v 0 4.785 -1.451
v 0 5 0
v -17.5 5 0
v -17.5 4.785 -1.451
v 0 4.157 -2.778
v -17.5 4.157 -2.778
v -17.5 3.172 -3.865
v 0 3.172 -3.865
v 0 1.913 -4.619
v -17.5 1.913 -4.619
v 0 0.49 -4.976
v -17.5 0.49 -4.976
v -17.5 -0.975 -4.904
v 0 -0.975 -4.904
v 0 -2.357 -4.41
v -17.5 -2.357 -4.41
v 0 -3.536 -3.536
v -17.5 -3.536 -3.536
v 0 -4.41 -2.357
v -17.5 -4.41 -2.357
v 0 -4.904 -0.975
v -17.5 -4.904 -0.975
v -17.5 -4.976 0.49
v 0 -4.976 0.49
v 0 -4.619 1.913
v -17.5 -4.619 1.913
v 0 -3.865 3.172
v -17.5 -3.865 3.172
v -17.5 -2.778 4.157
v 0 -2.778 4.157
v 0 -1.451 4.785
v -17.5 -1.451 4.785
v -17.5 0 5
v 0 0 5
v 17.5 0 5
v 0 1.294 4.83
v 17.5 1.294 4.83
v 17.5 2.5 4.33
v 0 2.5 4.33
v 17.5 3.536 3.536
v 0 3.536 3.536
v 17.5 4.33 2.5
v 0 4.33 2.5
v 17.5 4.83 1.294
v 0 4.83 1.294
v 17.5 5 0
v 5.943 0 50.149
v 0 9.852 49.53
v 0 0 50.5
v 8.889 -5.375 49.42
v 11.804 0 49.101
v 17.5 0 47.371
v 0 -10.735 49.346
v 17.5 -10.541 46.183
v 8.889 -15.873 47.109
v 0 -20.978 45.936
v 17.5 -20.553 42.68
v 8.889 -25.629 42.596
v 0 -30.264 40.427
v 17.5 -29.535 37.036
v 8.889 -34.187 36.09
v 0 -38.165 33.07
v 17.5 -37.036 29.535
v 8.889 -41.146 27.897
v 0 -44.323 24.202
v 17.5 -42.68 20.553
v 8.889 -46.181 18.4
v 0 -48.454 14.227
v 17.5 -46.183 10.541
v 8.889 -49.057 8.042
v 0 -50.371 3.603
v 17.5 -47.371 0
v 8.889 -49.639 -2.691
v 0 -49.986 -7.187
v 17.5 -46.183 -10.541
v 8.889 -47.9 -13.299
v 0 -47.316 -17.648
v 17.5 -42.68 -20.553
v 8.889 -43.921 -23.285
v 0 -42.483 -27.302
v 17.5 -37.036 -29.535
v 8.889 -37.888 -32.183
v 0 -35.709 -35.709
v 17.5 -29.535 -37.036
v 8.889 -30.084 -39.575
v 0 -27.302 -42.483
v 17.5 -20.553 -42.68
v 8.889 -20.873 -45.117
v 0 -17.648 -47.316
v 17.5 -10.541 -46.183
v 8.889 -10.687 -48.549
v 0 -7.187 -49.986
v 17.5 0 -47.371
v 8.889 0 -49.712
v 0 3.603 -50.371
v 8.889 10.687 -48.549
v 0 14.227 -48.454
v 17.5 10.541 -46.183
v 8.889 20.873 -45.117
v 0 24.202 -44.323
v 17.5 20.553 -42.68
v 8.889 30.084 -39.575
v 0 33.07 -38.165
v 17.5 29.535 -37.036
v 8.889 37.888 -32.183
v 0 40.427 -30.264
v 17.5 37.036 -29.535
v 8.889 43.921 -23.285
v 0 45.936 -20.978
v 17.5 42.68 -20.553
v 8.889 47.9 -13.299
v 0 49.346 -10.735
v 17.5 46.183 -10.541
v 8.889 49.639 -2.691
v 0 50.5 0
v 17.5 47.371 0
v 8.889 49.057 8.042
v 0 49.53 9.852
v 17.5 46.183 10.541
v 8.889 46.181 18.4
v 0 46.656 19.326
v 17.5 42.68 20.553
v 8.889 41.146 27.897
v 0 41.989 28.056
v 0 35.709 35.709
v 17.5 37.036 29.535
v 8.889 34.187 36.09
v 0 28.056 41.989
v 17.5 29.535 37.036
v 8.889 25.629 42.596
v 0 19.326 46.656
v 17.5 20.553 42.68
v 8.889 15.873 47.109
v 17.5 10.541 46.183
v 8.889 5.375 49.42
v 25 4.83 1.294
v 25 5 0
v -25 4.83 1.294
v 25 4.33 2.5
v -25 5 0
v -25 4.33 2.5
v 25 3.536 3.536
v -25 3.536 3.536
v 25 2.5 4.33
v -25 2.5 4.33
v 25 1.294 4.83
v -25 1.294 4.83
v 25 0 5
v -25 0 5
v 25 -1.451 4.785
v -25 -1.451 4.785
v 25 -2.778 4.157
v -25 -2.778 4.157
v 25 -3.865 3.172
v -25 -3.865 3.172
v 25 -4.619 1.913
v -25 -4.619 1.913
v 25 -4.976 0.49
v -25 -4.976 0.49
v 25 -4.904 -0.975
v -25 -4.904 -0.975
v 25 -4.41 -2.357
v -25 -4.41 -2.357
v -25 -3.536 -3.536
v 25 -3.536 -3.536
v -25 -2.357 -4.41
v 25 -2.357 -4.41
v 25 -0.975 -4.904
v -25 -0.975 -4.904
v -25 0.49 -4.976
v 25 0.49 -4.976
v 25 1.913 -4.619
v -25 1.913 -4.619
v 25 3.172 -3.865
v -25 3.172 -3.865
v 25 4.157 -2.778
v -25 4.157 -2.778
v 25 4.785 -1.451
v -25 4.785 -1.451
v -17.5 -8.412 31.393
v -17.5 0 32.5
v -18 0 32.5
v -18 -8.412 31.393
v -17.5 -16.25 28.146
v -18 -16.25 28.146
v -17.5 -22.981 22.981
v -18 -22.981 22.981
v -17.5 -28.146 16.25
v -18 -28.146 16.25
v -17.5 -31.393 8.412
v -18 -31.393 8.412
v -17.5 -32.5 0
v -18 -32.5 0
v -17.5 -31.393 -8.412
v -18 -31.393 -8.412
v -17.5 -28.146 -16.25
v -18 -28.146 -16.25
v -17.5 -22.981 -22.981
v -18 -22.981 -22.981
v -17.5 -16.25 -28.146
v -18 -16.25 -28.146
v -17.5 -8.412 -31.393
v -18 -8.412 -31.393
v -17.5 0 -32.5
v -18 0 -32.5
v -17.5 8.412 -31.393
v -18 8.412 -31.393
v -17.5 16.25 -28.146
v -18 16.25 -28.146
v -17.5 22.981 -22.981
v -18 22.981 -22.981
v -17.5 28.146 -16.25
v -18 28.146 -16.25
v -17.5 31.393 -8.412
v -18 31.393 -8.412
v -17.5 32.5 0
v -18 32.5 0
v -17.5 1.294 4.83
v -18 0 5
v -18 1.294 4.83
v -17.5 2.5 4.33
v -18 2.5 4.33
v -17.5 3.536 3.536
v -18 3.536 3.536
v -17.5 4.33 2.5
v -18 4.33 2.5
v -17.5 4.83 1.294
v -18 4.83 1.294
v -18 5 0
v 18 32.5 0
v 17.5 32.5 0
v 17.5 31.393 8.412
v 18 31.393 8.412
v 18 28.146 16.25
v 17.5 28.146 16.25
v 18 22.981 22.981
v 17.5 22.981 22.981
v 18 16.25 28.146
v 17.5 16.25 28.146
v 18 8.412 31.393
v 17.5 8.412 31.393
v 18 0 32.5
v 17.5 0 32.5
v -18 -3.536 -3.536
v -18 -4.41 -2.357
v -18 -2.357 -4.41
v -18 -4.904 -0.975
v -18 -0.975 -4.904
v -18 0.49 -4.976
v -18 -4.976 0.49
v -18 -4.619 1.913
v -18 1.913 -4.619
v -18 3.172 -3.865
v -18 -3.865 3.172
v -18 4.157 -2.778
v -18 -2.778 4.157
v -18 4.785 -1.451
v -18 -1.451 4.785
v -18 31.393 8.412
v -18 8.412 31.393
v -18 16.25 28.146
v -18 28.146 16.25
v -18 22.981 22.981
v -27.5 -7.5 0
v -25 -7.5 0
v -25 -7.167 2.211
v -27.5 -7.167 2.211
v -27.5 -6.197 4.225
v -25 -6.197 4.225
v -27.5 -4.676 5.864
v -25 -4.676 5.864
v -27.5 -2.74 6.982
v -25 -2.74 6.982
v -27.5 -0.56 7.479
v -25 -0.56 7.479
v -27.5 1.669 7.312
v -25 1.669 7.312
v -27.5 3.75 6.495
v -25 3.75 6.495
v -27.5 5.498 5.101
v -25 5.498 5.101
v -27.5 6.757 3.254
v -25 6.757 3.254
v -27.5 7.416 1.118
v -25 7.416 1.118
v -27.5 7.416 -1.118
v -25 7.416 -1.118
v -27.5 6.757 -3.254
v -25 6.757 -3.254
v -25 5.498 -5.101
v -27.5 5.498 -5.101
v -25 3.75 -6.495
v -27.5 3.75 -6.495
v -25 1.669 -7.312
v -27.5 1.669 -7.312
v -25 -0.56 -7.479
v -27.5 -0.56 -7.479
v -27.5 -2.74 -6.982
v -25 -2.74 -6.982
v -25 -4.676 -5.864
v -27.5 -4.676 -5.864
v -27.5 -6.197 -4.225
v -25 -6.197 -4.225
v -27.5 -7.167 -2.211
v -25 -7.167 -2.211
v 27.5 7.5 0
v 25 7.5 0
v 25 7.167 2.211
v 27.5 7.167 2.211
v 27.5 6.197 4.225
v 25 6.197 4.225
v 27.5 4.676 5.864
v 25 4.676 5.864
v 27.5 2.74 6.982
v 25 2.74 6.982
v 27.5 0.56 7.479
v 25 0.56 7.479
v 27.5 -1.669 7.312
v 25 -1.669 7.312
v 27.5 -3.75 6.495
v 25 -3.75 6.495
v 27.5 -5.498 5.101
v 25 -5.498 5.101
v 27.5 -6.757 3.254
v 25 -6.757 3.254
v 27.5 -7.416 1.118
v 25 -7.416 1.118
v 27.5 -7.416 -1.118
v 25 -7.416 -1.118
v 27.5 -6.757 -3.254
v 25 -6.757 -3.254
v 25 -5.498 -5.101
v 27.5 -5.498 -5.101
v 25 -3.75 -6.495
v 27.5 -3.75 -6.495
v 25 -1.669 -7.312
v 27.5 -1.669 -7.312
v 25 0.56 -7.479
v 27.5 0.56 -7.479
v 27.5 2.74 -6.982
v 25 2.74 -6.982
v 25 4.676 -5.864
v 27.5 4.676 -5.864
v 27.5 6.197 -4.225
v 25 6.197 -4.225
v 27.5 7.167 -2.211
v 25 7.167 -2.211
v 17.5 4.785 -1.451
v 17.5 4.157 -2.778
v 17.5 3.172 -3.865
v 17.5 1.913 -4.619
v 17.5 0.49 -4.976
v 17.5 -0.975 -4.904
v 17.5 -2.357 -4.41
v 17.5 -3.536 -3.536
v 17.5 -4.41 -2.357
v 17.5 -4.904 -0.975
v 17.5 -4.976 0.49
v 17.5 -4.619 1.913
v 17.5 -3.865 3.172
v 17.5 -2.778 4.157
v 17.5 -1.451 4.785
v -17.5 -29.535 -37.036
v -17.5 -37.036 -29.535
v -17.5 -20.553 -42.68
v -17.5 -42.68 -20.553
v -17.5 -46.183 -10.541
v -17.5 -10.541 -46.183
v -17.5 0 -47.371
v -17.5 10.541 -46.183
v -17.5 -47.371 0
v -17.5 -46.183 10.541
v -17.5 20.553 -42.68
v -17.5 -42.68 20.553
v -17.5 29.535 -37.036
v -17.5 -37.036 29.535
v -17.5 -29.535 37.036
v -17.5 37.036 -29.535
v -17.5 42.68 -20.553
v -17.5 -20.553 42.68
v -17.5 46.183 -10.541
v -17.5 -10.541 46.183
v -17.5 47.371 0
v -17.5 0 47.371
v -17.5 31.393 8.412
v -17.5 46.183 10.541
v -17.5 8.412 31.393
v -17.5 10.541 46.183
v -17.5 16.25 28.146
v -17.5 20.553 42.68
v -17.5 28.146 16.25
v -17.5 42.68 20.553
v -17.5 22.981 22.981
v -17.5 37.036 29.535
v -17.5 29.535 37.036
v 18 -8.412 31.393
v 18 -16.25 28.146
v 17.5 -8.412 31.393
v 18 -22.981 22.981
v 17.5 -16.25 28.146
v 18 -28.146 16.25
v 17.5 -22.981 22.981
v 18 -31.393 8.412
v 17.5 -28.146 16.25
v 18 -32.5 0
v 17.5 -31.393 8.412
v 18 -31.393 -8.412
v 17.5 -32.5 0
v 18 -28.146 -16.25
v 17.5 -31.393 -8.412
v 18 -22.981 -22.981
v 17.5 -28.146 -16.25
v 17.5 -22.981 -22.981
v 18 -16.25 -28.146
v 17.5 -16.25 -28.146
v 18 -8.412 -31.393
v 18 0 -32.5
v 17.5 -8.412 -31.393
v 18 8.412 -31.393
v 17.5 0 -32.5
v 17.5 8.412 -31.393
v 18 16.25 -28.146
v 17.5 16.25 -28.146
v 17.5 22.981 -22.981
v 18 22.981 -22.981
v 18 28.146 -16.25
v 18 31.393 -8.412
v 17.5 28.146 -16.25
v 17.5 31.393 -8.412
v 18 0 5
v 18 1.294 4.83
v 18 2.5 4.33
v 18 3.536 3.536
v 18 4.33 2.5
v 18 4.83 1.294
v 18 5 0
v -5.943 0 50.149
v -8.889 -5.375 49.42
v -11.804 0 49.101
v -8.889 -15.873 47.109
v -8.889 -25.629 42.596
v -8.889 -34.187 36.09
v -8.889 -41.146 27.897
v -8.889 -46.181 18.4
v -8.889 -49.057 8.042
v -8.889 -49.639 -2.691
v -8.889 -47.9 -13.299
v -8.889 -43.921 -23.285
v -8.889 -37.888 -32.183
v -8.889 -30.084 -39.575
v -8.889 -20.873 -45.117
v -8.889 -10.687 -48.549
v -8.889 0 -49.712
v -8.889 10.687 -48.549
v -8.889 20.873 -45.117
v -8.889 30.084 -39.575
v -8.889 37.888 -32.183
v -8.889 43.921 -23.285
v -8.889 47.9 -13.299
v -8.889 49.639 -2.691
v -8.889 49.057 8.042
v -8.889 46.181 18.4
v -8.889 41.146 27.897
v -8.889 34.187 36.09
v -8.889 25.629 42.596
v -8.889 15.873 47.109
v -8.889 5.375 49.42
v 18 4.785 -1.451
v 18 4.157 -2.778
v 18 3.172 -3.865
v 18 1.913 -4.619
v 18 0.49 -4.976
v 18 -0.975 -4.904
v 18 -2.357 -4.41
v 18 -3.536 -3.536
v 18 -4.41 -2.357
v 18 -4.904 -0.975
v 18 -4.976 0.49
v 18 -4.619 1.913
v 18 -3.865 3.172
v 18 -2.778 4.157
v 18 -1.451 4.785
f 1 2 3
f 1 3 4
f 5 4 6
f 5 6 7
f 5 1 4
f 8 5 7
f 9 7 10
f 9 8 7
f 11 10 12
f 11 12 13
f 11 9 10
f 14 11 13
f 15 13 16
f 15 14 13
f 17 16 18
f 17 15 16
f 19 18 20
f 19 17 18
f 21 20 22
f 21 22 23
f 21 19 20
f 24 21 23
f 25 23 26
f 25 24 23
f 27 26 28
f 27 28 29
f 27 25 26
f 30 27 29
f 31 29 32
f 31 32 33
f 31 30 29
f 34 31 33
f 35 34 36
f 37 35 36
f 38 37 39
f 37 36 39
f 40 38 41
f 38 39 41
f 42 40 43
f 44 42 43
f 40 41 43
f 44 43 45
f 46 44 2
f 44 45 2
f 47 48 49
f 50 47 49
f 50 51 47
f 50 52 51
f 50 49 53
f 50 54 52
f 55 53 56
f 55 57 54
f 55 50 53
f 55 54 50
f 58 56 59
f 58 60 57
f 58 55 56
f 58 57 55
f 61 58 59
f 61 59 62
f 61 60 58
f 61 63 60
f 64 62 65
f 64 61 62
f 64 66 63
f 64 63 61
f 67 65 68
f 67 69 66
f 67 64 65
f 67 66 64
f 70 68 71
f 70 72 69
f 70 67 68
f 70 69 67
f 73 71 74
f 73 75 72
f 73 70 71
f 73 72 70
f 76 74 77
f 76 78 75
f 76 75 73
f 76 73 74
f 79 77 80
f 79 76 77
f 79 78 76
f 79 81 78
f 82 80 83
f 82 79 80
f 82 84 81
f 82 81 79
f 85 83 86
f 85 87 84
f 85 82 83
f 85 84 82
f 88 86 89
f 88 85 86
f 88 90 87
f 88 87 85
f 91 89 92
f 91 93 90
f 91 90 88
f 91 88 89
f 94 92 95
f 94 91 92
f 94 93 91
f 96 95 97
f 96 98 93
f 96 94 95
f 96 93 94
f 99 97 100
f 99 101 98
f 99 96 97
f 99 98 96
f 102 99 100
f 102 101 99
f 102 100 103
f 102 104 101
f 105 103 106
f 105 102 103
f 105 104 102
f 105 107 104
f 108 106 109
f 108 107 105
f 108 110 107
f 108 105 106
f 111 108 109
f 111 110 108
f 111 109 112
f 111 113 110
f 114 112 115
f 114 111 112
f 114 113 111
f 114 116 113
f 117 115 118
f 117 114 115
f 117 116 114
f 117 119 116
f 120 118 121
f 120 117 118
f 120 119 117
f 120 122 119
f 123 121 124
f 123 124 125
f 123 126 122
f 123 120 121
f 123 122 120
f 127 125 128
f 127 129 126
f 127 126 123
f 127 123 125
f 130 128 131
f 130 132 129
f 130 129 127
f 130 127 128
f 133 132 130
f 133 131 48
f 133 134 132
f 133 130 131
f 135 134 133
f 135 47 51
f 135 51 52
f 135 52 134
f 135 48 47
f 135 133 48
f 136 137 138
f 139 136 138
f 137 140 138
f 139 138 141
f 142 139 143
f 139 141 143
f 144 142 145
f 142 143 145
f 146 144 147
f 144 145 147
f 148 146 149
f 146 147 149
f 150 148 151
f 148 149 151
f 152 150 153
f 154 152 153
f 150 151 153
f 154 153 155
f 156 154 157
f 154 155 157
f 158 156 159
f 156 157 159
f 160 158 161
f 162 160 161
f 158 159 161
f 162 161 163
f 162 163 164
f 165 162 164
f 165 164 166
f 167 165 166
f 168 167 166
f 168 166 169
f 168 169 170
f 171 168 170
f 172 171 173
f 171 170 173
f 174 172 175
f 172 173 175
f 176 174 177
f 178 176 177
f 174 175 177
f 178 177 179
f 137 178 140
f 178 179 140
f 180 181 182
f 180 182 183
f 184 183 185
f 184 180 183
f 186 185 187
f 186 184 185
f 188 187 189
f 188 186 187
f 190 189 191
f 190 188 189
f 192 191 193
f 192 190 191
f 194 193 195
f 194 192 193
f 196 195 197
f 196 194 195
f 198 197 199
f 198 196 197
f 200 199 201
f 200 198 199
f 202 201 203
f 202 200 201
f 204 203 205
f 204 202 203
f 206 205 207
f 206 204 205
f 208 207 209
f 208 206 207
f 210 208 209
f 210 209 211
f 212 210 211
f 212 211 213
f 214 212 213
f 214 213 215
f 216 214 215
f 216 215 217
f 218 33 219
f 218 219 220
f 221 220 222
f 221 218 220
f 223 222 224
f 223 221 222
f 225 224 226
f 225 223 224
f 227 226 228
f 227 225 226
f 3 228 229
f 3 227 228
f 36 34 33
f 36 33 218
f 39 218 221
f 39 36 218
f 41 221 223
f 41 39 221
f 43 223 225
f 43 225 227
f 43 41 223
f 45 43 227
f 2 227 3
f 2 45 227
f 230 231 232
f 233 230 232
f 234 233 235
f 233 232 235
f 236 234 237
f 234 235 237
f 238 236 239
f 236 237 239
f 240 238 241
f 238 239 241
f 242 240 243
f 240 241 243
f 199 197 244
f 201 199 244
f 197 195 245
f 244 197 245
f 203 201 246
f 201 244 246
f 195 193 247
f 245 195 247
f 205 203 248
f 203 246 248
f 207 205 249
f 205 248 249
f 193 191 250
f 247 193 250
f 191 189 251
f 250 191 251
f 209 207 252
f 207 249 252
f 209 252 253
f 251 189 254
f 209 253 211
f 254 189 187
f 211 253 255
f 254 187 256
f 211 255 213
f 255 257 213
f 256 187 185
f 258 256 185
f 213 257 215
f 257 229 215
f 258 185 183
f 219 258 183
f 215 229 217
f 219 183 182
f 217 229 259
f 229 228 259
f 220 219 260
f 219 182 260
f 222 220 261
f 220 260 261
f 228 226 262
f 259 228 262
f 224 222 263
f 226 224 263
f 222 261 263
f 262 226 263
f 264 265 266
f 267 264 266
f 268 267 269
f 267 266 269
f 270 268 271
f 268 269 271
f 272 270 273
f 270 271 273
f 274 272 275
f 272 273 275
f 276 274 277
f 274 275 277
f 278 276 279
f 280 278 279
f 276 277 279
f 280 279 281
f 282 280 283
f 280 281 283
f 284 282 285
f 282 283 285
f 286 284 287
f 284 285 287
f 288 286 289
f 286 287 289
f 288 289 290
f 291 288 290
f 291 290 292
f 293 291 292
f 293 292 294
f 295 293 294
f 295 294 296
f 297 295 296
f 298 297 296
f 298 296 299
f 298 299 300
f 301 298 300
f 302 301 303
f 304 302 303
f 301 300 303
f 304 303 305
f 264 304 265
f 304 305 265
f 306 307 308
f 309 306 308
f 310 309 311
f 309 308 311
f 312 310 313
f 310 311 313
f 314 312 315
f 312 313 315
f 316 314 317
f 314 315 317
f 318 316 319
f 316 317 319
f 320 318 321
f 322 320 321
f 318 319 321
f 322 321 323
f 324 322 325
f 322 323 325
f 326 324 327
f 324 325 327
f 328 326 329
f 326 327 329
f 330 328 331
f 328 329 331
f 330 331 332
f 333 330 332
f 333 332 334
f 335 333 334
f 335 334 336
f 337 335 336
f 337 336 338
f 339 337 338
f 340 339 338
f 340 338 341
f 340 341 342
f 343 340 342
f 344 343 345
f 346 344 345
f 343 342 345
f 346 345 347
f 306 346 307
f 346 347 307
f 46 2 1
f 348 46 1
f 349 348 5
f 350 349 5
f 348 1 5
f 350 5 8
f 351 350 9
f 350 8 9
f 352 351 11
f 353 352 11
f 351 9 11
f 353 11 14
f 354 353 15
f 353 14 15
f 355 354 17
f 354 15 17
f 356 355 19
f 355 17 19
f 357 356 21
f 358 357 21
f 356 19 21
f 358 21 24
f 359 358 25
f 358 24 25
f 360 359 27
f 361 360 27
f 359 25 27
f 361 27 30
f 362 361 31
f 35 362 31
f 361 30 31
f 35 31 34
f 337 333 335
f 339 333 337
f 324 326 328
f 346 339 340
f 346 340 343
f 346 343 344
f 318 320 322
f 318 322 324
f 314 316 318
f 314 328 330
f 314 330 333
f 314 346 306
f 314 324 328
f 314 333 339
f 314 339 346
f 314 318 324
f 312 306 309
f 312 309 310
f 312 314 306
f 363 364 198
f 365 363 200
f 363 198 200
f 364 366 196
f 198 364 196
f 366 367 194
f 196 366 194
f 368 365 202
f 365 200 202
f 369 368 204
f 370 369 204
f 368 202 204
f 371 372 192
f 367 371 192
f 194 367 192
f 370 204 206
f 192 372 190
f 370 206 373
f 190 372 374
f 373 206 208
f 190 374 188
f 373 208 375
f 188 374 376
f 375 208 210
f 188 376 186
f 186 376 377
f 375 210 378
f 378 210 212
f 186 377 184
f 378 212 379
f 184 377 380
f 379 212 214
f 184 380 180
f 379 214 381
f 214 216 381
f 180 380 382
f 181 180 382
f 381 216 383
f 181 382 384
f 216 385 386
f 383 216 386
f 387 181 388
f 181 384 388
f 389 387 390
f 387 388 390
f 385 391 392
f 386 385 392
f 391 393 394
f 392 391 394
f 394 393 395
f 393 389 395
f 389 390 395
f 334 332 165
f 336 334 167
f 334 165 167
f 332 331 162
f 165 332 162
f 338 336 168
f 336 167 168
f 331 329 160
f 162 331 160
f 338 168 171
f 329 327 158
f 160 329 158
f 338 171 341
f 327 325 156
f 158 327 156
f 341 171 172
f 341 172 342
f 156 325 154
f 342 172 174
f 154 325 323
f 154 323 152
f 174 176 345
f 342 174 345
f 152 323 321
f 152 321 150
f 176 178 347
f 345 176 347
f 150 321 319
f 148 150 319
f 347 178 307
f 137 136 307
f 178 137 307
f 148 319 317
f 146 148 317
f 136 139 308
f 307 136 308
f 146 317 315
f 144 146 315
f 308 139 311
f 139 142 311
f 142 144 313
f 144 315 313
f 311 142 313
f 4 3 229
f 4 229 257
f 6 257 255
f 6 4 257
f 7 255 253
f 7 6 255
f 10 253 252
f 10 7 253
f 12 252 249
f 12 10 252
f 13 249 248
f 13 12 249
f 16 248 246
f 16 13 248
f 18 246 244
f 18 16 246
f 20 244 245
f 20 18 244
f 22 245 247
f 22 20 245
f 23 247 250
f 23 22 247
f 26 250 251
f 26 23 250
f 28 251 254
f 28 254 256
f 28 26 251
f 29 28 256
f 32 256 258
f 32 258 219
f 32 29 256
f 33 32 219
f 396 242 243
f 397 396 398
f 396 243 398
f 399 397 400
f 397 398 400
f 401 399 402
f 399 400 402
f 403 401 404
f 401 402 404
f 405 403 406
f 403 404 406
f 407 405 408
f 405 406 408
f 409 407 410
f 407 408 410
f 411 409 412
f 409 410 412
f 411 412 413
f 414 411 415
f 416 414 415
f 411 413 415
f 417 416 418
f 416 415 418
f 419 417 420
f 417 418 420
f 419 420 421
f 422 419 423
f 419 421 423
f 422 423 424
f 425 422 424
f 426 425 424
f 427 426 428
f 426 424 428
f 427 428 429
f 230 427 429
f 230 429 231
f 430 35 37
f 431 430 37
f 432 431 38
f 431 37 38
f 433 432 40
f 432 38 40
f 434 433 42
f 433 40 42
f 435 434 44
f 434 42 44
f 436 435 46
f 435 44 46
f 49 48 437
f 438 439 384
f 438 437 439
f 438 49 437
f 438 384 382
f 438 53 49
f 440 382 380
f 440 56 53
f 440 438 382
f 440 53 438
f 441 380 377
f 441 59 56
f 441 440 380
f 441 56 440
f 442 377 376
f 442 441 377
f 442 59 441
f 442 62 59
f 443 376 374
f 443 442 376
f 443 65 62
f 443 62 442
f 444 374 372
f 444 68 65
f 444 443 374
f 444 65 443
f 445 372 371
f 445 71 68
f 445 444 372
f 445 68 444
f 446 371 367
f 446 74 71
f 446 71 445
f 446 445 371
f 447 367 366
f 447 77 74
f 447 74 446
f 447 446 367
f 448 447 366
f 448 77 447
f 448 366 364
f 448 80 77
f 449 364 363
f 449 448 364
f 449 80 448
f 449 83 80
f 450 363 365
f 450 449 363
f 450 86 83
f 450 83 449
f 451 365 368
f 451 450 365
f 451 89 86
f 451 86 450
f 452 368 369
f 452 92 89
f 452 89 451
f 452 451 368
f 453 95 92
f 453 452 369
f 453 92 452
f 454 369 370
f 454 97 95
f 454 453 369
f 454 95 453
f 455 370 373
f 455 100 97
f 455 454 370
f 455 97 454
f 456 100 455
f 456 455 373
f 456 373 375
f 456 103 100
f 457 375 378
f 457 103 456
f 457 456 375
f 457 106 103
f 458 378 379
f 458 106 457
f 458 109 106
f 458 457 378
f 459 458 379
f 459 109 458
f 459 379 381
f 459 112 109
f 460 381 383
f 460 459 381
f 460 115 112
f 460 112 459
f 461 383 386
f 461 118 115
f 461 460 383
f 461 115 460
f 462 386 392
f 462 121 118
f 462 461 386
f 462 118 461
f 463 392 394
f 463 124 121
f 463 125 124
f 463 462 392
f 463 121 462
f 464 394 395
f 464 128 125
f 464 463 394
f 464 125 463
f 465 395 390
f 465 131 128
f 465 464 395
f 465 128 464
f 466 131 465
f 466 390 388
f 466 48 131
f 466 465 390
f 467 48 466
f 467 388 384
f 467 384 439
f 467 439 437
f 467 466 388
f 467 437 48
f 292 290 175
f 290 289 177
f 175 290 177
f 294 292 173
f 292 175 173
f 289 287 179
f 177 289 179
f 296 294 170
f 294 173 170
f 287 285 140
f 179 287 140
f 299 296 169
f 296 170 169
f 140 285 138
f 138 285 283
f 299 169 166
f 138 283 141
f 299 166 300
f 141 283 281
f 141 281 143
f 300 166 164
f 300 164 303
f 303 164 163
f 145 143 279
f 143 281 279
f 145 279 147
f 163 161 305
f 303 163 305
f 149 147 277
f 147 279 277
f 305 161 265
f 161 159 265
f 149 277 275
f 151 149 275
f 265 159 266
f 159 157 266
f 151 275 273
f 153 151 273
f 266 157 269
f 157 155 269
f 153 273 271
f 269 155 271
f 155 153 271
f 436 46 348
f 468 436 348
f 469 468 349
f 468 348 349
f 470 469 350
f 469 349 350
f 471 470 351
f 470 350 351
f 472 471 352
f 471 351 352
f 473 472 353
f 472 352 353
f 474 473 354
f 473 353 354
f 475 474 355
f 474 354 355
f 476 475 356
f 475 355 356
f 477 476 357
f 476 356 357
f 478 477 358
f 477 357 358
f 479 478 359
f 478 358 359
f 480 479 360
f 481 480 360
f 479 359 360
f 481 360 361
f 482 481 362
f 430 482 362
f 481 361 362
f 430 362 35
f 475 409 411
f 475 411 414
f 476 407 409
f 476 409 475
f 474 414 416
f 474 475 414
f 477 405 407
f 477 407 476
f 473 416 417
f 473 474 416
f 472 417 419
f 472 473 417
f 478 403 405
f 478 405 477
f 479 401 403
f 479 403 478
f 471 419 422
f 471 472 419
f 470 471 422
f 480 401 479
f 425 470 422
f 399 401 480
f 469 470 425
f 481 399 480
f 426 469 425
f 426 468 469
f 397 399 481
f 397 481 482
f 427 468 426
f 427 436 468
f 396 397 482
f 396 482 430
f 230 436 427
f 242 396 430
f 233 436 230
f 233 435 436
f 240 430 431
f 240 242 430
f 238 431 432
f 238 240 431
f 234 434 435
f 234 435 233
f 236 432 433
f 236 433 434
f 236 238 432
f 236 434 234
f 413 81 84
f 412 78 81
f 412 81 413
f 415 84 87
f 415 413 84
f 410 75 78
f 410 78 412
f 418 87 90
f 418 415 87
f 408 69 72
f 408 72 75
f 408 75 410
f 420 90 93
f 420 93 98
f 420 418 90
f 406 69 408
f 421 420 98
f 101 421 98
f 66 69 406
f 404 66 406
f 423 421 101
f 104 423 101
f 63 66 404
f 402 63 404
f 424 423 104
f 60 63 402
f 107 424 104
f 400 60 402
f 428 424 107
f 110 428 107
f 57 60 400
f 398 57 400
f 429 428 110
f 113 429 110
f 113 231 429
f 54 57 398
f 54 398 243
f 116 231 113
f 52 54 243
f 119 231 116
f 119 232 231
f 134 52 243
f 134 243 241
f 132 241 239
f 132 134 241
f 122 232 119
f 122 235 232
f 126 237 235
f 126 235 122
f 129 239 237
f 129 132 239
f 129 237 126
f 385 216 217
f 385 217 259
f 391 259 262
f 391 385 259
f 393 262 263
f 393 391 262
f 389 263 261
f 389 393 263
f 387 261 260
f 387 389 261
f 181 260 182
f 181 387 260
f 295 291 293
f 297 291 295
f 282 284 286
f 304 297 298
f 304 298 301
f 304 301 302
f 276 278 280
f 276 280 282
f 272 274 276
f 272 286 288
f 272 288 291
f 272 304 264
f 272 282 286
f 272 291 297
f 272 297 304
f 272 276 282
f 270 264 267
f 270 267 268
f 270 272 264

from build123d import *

# Parameters (mm, degrees)
F1_DEPTH = 17.5
F2_DEPTH = 18
F5_DEPTH = 25
F6_R     = 7.5
F7_DEPTH = 2.5
F8_R     = 7.5
F9_DEPTH = 2.5


# Not quite as in the source:
# - a feature names something its author has since deleted; it is built from what else it names


with BuildPart() as f1:
    # F0 (on Right) → F1 (new body, symmetric)
    with BuildSketch(Plane.YZ):
        with BuildLine():
            ThreePointArc((0, 50.5), (-35.7088924499, -35.7088924499), (50.5, 0))
            ThreePointArc((50.5, 0), (35.7088924499, 35.7088924499), (0, 50.5))
        make_face()
        with BuildLine():
            ThreePointArc((35, 0), (-24.7487373415, -24.7487373415), (0, 35))
            ThreePointArc((0, 35), (24.7487373415, 24.7487373415), (35, 0))
        make_face(mode=Mode.SUBTRACT)
        with BuildLine():
            ThreePointArc((35, 0), (24.7487373415, 24.7487373415), (0, 35))
            ThreePointArc((0, 35), (-24.7487373415, -24.7487373415), (35, 0))
        make_face()
        with BuildLine():
            ThreePointArc((32.5, 0), (-22.9809703886, -22.9809703886), (0, 32.5))
            ThreePointArc((0, 32.5), (22.9809703886, 22.9809703886), (32.5, 0))
        make_face(mode=Mode.SUBTRACT)
        with BuildLine():
            ThreePointArc((32.5, 0), (22.9809703886, 22.9809703886), (0, 32.5))
            ThreePointArc((0, 32.5), (-22.9809703886, -22.9809703886), (32.5, 0))
        make_face()
        with BuildLine():
            ThreePointArc((5, 0), (-3.5355339059, -3.5355339059), (0, 5))
            ThreePointArc((0, 5), (3.5355339059, 3.5355339059), (5, 0))
        make_face(mode=Mode.SUBTRACT)
    extrude(amount=F1_DEPTH, both=True)

    # F0 (on Right) → F2 (join, symmetric)
    with BuildSketch(Plane.YZ):
        with BuildLine():
            ThreePointArc((32.5, 0), (22.9809703886, 22.9809703886), (0, 32.5))
            ThreePointArc((0, 32.5), (-22.9809703886, -22.9809703886), (32.5, 0))
        make_face()
        with BuildLine():
            ThreePointArc((5, 0), (-3.5355339059, -3.5355339059), (0, 5))
            ThreePointArc((0, 5), (3.5355339059, 3.5355339059), (5, 0))
        make_face(mode=Mode.SUBTRACT)
    extrude(amount=F2_DEPTH, both=True)

    # F3 (on Front) → F4 (revolve, cut)
    with BuildSketch(Plane.XZ):
        with BuildLine():
            ThreePointArc((-17.5, 47.3708771293), (-8.888776771, 49.7115645249), (0, 50.5))
            Line((0, 50.5), (-17.5, 50.5))
            Line((-17.5, 50.5), (-17.5, 47.3708771293))
        make_face()
        with BuildLine():
            Line((17.5, 50.5), (0, 50.5))
            ThreePointArc((0, 50.5), (8.888776771, 49.7115645249), (17.5, 47.3708771293))
            Line((17.5, 47.3708771293), (17.5, 50.5))
        make_face()
    revolve(axis=Axis((-0.1237622588, 0, 0), (1, 0, 0)), mode=Mode.SUBTRACT)


with BuildPart() as f5:
    # F0 (on Right) → F5 (new body, symmetric)
    with BuildSketch(Plane.YZ):
        with BuildLine():
            ThreePointArc((5, 0), (3.5355339059, 3.5355339059), (0, 5))
            ThreePointArc((0, 5), (-3.5355339059, -3.5355339059), (5, 0))
        make_face()
    extrude(amount=F5_DEPTH, both=True)

    # F6 (on face) → F7 (join)
    with BuildSketch(Plane.YZ.offset(25)):
        Circle(F6_R)
        with BuildLine():
            ThreePointArc((5, 0), (-3.5355339059, -3.5355339059), (0, 5))
            ThreePointArc((0, 5), (3.5355339059, 3.5355339059), (5, 0))
        make_face(mode=Mode.SUBTRACT)
        with BuildLine():
            ThreePointArc((5, 0), (3.5355339059, 3.5355339059), (0, 5))
            ThreePointArc((0, 5), (-3.5355339059, -3.5355339059), (5, 0))
        make_face()
    extrude(amount=F7_DEPTH)

    # F8 (on face) → F9 (join)
    with BuildSketch(Plane(origin=(-25, 0, 0), x_dir=(0, -1, 0), z_dir=(-1, 0, 0))):
        Circle(F8_R)
        with BuildLine():
            ThreePointArc((0, 5), (3.5355339059, -3.5355339059), (-5, 0))
            ThreePointArc((-5, 0), (-3.5355339059, 3.5355339059), (0, 5))
        make_face(mode=Mode.SUBTRACT)
        with BuildLine():
            ThreePointArc((0, 5), (-3.5355339059, 3.5355339059), (-5, 0))
            ThreePointArc((-5, 0), (3.5355339059, -3.5355339059), (0, 5))
        make_face()
    extrude(amount=F9_DEPTH)


solid = Compound([f1.part, f5.part])
